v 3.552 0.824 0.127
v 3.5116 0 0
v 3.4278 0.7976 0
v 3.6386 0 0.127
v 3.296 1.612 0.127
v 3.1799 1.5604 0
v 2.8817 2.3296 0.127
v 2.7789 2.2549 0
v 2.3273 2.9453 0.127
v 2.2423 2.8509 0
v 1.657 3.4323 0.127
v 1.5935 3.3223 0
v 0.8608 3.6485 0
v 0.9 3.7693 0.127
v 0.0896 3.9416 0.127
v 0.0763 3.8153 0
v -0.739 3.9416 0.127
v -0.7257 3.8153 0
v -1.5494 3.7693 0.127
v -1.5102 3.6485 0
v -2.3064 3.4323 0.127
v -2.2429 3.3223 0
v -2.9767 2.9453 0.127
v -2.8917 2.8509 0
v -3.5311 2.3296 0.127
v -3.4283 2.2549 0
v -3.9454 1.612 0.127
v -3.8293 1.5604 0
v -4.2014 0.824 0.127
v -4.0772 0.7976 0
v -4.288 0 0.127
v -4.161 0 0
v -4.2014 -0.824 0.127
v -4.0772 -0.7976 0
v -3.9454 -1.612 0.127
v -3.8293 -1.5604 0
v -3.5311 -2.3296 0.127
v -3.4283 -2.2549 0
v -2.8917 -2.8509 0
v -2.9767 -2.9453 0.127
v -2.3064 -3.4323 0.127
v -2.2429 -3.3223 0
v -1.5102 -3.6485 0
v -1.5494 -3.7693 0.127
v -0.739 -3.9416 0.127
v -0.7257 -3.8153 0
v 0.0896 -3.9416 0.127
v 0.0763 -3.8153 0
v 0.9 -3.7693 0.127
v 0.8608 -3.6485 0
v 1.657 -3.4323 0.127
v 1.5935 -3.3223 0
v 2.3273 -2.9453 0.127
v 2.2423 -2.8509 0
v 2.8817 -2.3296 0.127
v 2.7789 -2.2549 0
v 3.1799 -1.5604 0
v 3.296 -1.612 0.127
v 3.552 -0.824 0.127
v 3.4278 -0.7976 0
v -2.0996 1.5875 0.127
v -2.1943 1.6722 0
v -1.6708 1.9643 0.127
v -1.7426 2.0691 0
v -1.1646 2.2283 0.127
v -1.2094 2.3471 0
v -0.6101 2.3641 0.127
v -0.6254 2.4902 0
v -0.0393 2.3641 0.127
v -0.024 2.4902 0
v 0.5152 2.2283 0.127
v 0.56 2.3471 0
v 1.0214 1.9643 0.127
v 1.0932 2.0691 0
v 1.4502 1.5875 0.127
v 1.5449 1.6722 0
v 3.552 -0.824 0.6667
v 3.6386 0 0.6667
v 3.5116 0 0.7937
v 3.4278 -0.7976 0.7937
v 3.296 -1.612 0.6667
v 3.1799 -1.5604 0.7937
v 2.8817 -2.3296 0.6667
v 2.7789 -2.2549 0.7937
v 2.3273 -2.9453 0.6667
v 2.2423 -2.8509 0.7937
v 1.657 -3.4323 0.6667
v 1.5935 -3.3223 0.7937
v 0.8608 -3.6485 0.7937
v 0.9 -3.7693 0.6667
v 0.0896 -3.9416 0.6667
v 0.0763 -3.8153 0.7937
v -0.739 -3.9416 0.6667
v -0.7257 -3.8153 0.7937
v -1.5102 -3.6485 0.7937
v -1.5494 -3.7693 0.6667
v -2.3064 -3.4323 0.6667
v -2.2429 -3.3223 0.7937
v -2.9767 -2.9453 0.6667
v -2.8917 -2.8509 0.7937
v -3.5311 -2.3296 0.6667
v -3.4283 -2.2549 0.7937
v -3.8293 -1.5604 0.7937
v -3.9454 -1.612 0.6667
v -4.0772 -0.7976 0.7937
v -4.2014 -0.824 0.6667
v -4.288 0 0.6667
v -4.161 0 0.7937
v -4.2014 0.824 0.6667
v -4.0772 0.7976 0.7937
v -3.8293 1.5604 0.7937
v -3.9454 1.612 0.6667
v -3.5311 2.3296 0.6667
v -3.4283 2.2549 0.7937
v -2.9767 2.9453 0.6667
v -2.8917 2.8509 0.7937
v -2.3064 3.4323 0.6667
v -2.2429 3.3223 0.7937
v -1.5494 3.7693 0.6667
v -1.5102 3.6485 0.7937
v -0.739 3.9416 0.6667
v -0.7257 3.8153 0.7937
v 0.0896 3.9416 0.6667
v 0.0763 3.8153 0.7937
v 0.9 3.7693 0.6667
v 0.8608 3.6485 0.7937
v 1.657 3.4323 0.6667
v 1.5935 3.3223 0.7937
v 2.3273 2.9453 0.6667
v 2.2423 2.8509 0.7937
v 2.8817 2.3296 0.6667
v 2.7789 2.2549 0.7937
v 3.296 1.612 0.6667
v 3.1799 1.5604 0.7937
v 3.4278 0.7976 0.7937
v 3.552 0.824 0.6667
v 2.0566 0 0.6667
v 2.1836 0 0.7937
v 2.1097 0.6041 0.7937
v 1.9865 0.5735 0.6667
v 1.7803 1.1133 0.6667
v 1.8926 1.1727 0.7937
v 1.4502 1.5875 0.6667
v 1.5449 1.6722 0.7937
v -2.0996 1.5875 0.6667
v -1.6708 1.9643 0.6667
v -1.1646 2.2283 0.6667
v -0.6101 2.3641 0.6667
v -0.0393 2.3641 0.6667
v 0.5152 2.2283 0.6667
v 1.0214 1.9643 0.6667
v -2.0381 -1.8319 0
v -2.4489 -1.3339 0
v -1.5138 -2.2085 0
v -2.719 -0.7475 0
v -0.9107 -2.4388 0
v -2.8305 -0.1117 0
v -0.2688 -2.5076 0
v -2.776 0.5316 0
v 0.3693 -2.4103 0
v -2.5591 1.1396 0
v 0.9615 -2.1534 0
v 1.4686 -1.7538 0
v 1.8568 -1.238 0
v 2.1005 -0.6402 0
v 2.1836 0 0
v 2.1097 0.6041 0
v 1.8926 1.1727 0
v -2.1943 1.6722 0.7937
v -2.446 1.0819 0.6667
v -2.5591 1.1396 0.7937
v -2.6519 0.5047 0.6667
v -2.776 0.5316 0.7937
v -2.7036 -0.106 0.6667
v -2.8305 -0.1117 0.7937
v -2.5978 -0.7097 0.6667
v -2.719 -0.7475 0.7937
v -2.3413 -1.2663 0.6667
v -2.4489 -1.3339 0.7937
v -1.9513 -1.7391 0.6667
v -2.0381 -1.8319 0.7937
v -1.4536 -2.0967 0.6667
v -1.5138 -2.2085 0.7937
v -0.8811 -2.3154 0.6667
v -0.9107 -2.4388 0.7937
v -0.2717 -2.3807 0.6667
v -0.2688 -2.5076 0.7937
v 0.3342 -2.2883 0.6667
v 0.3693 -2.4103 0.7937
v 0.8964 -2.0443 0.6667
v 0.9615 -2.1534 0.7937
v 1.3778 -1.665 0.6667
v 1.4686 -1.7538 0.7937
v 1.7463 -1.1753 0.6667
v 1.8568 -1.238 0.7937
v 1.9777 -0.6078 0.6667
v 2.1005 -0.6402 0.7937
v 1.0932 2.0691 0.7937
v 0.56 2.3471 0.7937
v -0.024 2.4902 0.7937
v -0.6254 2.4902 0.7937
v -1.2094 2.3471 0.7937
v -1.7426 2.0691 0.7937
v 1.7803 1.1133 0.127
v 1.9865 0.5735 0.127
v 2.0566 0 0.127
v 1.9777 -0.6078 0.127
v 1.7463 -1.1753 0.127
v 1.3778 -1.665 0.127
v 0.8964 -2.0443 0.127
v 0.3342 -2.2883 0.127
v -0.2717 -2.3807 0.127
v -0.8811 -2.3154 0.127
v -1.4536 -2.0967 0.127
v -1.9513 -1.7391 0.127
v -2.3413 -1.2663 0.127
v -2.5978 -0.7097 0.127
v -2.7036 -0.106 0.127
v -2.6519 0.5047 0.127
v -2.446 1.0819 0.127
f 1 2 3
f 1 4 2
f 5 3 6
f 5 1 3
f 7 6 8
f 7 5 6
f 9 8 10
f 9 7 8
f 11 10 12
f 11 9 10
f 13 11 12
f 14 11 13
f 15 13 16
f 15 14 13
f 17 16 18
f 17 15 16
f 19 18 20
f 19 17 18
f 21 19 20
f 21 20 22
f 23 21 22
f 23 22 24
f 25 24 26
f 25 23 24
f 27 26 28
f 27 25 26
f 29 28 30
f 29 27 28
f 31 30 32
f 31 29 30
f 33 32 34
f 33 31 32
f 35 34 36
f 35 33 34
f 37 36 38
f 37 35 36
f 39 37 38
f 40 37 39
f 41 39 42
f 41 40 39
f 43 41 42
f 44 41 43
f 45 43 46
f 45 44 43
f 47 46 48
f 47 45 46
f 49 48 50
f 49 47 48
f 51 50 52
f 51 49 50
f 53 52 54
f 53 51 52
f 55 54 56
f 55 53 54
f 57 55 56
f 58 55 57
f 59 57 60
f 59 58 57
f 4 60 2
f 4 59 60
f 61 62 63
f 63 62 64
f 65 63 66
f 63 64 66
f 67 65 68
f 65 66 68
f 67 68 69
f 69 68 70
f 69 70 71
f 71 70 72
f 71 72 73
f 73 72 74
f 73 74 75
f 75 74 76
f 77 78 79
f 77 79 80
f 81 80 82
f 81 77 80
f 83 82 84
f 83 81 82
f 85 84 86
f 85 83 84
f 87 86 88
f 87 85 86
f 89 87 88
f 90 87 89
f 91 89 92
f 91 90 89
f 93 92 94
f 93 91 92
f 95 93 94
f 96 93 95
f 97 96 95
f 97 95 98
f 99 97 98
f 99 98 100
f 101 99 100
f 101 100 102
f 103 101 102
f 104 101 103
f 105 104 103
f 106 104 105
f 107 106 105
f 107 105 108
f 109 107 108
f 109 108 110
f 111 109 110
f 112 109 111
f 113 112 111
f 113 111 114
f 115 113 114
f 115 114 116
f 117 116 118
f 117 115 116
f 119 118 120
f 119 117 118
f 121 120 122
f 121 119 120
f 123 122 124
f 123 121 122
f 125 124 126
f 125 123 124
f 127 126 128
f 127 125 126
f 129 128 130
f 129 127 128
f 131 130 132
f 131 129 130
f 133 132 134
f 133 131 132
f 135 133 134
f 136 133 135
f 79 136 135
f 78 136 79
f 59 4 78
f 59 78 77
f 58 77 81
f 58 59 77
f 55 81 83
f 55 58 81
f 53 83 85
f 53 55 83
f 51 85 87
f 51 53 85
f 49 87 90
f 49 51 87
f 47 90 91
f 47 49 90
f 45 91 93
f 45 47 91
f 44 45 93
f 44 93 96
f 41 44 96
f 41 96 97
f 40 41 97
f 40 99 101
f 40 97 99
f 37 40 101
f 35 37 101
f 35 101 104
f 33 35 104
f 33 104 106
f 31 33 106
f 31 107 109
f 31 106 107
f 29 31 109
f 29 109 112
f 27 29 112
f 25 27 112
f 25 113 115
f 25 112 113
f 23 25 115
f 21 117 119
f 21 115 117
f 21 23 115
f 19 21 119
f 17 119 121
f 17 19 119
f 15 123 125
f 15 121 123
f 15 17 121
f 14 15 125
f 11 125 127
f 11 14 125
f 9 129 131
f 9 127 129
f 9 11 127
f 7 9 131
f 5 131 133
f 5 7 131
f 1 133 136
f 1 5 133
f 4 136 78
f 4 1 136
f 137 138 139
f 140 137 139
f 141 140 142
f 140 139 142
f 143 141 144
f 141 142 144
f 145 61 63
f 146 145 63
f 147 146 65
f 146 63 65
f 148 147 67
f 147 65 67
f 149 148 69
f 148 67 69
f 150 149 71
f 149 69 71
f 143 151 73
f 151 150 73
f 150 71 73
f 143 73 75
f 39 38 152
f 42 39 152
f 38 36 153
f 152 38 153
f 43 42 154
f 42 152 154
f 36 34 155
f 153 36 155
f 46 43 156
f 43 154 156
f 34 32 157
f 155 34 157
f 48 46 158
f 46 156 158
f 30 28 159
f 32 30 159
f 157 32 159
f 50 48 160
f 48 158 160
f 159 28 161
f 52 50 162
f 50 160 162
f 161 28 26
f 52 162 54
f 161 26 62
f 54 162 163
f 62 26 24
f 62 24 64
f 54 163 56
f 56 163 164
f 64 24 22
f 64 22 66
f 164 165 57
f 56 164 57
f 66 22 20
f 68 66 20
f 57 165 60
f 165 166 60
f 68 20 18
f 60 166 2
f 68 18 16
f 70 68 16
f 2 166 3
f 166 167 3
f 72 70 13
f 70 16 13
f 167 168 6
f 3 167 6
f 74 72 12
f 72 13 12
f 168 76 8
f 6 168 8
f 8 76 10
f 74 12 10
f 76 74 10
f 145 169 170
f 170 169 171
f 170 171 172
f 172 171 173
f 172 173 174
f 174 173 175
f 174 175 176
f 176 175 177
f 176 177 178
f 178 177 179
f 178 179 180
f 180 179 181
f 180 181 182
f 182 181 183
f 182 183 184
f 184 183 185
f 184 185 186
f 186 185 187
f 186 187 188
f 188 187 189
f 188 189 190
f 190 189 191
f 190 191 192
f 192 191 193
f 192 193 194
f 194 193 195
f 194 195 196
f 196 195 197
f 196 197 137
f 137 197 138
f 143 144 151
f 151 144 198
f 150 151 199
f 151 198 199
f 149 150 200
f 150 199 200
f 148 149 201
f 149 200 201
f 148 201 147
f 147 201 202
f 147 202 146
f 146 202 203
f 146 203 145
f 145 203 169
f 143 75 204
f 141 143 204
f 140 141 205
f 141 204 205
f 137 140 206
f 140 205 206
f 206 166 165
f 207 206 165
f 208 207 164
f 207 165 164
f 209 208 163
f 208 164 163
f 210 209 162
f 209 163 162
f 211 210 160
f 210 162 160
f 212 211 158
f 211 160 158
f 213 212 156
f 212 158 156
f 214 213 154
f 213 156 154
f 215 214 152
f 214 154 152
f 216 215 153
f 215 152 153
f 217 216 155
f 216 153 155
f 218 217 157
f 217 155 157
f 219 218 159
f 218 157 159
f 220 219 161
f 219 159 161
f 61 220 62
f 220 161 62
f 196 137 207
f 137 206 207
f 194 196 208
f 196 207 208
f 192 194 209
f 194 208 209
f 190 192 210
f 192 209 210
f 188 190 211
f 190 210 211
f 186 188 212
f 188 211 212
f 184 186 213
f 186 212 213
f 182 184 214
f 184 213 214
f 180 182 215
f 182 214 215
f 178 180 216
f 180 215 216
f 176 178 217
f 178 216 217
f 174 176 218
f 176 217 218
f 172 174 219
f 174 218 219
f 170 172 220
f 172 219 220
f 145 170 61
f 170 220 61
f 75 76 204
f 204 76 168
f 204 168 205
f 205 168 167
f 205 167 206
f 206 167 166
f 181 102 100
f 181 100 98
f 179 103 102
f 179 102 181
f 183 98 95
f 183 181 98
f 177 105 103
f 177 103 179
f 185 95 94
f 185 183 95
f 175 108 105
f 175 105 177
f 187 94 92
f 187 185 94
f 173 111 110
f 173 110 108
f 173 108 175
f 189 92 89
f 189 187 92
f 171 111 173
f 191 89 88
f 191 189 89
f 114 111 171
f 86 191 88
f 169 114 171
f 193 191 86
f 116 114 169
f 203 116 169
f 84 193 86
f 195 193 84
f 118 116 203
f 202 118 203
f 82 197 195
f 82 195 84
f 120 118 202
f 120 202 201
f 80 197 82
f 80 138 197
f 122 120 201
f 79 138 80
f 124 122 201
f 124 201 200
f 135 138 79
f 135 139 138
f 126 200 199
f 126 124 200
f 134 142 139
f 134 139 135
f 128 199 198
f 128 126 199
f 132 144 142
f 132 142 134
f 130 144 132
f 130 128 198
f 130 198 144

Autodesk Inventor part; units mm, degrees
ref_plane "YZ Plane" through (0, 0, 0) normal (1, 0, 0) x (0, 1, 0)
ref_plane "XZ Plane" through (0, 0, 0) normal (0, 1, 0) x (-1, 0, 0)
ref_plane "Work Plane1" through (0, 0, 0) normal (0, 0, 1) x (1, 0, 0)
sketch "Sketch2" plane through (0, 0, 0) normal (0, 0, 1) x (1, 0, 0)
  arc A0 (-2.0996, 1.5875) -> (1.4502, 1.5875) centre (-0.3247, 0) ccw projected
  circle A1 centre (-0.3247, 0) radius 2.3813
  circle A2 centre (-0.3247, 0) radius 3.9633
extrude "Extrusion1" add sketch "Sketch2" along normal blind 0.7937
chamfer "Chamfer1" distance 0.127 angle 45 4 edges at (-4.288, 0, 0) (-4.288, 0, 0.7937) (-2.706, 0, 0.7937) (-2.706, 0, 0)
properties part number "thrust washer" material "Rubber"
